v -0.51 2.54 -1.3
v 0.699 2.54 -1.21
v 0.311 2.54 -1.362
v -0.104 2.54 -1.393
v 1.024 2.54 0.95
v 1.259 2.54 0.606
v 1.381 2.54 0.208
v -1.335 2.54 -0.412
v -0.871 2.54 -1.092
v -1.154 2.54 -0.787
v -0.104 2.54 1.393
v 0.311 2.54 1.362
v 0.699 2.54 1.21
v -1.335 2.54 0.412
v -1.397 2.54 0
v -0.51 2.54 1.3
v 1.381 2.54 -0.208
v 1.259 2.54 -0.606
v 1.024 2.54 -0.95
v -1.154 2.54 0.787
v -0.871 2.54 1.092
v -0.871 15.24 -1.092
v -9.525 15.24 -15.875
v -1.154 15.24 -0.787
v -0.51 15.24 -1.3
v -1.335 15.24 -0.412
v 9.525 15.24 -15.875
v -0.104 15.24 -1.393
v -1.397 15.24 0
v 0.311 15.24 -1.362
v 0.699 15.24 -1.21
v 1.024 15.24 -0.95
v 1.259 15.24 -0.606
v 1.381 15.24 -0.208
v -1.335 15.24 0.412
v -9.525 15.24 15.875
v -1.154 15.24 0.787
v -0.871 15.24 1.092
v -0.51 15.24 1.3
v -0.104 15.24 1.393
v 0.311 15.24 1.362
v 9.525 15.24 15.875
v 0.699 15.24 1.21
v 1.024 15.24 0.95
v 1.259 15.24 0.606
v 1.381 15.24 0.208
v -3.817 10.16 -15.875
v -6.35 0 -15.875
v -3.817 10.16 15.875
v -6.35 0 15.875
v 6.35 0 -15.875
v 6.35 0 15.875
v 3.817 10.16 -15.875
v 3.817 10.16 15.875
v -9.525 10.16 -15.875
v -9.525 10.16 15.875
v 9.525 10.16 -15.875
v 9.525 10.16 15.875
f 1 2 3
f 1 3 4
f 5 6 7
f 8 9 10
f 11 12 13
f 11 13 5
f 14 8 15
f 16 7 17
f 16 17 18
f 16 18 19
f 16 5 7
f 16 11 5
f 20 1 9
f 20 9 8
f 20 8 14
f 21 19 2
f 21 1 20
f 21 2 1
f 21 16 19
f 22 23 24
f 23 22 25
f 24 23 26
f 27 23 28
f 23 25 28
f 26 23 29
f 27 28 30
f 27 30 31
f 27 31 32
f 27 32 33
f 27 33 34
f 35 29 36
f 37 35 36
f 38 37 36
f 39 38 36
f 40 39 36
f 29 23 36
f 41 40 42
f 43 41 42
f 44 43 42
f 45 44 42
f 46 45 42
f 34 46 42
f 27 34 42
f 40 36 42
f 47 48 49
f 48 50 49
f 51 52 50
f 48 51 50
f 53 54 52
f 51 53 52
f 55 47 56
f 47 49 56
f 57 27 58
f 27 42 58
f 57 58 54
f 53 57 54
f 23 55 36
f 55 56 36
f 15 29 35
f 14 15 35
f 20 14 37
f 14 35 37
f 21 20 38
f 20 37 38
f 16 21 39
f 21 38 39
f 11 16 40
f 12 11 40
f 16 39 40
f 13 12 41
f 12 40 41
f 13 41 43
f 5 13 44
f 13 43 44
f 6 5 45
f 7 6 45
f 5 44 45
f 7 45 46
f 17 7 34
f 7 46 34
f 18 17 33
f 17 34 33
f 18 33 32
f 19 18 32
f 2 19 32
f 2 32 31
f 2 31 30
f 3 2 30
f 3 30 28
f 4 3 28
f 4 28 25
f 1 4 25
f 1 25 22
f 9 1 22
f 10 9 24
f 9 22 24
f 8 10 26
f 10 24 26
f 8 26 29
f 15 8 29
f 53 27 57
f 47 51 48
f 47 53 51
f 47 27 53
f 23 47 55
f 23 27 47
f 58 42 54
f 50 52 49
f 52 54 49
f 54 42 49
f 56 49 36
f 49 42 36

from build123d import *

# Parameters (mm, degrees)
BASE_EXTRUDE_DEPTH = 15.875
SKETCH3_R          = 1.397
CUT_EXTRUDE2_DEPTH = 12.7


with BuildPart() as part:
    # Sketch1 → Base-Extrude (new body, symmetric)
    with BuildSketch(Plane.XY):
        Polygon((6.35, 0), (-6.35, 0), (-3.816827491, 10.16), (-9.525, 10.16), (-9.525, 15.24), (9.525, 15.24), (9.525, 10.16), (3.816827491, 10.16), align=None)
    extrude(amount=BASE_EXTRUDE_DEPTH, both=True)

    # Sketch3 → Cut-Extrude2 (cut)
    with BuildSketch(Plane(origin=(0, 15.24, 0), x_dir=(-1, 0, 0), z_dir=(0, 1, 0))):
        Circle(SKETCH3_R)
    extrude(amount=-CUT_EXTRUDE2_DEPTH, mode=Mode.SUBTRACT)


solid = part.part
